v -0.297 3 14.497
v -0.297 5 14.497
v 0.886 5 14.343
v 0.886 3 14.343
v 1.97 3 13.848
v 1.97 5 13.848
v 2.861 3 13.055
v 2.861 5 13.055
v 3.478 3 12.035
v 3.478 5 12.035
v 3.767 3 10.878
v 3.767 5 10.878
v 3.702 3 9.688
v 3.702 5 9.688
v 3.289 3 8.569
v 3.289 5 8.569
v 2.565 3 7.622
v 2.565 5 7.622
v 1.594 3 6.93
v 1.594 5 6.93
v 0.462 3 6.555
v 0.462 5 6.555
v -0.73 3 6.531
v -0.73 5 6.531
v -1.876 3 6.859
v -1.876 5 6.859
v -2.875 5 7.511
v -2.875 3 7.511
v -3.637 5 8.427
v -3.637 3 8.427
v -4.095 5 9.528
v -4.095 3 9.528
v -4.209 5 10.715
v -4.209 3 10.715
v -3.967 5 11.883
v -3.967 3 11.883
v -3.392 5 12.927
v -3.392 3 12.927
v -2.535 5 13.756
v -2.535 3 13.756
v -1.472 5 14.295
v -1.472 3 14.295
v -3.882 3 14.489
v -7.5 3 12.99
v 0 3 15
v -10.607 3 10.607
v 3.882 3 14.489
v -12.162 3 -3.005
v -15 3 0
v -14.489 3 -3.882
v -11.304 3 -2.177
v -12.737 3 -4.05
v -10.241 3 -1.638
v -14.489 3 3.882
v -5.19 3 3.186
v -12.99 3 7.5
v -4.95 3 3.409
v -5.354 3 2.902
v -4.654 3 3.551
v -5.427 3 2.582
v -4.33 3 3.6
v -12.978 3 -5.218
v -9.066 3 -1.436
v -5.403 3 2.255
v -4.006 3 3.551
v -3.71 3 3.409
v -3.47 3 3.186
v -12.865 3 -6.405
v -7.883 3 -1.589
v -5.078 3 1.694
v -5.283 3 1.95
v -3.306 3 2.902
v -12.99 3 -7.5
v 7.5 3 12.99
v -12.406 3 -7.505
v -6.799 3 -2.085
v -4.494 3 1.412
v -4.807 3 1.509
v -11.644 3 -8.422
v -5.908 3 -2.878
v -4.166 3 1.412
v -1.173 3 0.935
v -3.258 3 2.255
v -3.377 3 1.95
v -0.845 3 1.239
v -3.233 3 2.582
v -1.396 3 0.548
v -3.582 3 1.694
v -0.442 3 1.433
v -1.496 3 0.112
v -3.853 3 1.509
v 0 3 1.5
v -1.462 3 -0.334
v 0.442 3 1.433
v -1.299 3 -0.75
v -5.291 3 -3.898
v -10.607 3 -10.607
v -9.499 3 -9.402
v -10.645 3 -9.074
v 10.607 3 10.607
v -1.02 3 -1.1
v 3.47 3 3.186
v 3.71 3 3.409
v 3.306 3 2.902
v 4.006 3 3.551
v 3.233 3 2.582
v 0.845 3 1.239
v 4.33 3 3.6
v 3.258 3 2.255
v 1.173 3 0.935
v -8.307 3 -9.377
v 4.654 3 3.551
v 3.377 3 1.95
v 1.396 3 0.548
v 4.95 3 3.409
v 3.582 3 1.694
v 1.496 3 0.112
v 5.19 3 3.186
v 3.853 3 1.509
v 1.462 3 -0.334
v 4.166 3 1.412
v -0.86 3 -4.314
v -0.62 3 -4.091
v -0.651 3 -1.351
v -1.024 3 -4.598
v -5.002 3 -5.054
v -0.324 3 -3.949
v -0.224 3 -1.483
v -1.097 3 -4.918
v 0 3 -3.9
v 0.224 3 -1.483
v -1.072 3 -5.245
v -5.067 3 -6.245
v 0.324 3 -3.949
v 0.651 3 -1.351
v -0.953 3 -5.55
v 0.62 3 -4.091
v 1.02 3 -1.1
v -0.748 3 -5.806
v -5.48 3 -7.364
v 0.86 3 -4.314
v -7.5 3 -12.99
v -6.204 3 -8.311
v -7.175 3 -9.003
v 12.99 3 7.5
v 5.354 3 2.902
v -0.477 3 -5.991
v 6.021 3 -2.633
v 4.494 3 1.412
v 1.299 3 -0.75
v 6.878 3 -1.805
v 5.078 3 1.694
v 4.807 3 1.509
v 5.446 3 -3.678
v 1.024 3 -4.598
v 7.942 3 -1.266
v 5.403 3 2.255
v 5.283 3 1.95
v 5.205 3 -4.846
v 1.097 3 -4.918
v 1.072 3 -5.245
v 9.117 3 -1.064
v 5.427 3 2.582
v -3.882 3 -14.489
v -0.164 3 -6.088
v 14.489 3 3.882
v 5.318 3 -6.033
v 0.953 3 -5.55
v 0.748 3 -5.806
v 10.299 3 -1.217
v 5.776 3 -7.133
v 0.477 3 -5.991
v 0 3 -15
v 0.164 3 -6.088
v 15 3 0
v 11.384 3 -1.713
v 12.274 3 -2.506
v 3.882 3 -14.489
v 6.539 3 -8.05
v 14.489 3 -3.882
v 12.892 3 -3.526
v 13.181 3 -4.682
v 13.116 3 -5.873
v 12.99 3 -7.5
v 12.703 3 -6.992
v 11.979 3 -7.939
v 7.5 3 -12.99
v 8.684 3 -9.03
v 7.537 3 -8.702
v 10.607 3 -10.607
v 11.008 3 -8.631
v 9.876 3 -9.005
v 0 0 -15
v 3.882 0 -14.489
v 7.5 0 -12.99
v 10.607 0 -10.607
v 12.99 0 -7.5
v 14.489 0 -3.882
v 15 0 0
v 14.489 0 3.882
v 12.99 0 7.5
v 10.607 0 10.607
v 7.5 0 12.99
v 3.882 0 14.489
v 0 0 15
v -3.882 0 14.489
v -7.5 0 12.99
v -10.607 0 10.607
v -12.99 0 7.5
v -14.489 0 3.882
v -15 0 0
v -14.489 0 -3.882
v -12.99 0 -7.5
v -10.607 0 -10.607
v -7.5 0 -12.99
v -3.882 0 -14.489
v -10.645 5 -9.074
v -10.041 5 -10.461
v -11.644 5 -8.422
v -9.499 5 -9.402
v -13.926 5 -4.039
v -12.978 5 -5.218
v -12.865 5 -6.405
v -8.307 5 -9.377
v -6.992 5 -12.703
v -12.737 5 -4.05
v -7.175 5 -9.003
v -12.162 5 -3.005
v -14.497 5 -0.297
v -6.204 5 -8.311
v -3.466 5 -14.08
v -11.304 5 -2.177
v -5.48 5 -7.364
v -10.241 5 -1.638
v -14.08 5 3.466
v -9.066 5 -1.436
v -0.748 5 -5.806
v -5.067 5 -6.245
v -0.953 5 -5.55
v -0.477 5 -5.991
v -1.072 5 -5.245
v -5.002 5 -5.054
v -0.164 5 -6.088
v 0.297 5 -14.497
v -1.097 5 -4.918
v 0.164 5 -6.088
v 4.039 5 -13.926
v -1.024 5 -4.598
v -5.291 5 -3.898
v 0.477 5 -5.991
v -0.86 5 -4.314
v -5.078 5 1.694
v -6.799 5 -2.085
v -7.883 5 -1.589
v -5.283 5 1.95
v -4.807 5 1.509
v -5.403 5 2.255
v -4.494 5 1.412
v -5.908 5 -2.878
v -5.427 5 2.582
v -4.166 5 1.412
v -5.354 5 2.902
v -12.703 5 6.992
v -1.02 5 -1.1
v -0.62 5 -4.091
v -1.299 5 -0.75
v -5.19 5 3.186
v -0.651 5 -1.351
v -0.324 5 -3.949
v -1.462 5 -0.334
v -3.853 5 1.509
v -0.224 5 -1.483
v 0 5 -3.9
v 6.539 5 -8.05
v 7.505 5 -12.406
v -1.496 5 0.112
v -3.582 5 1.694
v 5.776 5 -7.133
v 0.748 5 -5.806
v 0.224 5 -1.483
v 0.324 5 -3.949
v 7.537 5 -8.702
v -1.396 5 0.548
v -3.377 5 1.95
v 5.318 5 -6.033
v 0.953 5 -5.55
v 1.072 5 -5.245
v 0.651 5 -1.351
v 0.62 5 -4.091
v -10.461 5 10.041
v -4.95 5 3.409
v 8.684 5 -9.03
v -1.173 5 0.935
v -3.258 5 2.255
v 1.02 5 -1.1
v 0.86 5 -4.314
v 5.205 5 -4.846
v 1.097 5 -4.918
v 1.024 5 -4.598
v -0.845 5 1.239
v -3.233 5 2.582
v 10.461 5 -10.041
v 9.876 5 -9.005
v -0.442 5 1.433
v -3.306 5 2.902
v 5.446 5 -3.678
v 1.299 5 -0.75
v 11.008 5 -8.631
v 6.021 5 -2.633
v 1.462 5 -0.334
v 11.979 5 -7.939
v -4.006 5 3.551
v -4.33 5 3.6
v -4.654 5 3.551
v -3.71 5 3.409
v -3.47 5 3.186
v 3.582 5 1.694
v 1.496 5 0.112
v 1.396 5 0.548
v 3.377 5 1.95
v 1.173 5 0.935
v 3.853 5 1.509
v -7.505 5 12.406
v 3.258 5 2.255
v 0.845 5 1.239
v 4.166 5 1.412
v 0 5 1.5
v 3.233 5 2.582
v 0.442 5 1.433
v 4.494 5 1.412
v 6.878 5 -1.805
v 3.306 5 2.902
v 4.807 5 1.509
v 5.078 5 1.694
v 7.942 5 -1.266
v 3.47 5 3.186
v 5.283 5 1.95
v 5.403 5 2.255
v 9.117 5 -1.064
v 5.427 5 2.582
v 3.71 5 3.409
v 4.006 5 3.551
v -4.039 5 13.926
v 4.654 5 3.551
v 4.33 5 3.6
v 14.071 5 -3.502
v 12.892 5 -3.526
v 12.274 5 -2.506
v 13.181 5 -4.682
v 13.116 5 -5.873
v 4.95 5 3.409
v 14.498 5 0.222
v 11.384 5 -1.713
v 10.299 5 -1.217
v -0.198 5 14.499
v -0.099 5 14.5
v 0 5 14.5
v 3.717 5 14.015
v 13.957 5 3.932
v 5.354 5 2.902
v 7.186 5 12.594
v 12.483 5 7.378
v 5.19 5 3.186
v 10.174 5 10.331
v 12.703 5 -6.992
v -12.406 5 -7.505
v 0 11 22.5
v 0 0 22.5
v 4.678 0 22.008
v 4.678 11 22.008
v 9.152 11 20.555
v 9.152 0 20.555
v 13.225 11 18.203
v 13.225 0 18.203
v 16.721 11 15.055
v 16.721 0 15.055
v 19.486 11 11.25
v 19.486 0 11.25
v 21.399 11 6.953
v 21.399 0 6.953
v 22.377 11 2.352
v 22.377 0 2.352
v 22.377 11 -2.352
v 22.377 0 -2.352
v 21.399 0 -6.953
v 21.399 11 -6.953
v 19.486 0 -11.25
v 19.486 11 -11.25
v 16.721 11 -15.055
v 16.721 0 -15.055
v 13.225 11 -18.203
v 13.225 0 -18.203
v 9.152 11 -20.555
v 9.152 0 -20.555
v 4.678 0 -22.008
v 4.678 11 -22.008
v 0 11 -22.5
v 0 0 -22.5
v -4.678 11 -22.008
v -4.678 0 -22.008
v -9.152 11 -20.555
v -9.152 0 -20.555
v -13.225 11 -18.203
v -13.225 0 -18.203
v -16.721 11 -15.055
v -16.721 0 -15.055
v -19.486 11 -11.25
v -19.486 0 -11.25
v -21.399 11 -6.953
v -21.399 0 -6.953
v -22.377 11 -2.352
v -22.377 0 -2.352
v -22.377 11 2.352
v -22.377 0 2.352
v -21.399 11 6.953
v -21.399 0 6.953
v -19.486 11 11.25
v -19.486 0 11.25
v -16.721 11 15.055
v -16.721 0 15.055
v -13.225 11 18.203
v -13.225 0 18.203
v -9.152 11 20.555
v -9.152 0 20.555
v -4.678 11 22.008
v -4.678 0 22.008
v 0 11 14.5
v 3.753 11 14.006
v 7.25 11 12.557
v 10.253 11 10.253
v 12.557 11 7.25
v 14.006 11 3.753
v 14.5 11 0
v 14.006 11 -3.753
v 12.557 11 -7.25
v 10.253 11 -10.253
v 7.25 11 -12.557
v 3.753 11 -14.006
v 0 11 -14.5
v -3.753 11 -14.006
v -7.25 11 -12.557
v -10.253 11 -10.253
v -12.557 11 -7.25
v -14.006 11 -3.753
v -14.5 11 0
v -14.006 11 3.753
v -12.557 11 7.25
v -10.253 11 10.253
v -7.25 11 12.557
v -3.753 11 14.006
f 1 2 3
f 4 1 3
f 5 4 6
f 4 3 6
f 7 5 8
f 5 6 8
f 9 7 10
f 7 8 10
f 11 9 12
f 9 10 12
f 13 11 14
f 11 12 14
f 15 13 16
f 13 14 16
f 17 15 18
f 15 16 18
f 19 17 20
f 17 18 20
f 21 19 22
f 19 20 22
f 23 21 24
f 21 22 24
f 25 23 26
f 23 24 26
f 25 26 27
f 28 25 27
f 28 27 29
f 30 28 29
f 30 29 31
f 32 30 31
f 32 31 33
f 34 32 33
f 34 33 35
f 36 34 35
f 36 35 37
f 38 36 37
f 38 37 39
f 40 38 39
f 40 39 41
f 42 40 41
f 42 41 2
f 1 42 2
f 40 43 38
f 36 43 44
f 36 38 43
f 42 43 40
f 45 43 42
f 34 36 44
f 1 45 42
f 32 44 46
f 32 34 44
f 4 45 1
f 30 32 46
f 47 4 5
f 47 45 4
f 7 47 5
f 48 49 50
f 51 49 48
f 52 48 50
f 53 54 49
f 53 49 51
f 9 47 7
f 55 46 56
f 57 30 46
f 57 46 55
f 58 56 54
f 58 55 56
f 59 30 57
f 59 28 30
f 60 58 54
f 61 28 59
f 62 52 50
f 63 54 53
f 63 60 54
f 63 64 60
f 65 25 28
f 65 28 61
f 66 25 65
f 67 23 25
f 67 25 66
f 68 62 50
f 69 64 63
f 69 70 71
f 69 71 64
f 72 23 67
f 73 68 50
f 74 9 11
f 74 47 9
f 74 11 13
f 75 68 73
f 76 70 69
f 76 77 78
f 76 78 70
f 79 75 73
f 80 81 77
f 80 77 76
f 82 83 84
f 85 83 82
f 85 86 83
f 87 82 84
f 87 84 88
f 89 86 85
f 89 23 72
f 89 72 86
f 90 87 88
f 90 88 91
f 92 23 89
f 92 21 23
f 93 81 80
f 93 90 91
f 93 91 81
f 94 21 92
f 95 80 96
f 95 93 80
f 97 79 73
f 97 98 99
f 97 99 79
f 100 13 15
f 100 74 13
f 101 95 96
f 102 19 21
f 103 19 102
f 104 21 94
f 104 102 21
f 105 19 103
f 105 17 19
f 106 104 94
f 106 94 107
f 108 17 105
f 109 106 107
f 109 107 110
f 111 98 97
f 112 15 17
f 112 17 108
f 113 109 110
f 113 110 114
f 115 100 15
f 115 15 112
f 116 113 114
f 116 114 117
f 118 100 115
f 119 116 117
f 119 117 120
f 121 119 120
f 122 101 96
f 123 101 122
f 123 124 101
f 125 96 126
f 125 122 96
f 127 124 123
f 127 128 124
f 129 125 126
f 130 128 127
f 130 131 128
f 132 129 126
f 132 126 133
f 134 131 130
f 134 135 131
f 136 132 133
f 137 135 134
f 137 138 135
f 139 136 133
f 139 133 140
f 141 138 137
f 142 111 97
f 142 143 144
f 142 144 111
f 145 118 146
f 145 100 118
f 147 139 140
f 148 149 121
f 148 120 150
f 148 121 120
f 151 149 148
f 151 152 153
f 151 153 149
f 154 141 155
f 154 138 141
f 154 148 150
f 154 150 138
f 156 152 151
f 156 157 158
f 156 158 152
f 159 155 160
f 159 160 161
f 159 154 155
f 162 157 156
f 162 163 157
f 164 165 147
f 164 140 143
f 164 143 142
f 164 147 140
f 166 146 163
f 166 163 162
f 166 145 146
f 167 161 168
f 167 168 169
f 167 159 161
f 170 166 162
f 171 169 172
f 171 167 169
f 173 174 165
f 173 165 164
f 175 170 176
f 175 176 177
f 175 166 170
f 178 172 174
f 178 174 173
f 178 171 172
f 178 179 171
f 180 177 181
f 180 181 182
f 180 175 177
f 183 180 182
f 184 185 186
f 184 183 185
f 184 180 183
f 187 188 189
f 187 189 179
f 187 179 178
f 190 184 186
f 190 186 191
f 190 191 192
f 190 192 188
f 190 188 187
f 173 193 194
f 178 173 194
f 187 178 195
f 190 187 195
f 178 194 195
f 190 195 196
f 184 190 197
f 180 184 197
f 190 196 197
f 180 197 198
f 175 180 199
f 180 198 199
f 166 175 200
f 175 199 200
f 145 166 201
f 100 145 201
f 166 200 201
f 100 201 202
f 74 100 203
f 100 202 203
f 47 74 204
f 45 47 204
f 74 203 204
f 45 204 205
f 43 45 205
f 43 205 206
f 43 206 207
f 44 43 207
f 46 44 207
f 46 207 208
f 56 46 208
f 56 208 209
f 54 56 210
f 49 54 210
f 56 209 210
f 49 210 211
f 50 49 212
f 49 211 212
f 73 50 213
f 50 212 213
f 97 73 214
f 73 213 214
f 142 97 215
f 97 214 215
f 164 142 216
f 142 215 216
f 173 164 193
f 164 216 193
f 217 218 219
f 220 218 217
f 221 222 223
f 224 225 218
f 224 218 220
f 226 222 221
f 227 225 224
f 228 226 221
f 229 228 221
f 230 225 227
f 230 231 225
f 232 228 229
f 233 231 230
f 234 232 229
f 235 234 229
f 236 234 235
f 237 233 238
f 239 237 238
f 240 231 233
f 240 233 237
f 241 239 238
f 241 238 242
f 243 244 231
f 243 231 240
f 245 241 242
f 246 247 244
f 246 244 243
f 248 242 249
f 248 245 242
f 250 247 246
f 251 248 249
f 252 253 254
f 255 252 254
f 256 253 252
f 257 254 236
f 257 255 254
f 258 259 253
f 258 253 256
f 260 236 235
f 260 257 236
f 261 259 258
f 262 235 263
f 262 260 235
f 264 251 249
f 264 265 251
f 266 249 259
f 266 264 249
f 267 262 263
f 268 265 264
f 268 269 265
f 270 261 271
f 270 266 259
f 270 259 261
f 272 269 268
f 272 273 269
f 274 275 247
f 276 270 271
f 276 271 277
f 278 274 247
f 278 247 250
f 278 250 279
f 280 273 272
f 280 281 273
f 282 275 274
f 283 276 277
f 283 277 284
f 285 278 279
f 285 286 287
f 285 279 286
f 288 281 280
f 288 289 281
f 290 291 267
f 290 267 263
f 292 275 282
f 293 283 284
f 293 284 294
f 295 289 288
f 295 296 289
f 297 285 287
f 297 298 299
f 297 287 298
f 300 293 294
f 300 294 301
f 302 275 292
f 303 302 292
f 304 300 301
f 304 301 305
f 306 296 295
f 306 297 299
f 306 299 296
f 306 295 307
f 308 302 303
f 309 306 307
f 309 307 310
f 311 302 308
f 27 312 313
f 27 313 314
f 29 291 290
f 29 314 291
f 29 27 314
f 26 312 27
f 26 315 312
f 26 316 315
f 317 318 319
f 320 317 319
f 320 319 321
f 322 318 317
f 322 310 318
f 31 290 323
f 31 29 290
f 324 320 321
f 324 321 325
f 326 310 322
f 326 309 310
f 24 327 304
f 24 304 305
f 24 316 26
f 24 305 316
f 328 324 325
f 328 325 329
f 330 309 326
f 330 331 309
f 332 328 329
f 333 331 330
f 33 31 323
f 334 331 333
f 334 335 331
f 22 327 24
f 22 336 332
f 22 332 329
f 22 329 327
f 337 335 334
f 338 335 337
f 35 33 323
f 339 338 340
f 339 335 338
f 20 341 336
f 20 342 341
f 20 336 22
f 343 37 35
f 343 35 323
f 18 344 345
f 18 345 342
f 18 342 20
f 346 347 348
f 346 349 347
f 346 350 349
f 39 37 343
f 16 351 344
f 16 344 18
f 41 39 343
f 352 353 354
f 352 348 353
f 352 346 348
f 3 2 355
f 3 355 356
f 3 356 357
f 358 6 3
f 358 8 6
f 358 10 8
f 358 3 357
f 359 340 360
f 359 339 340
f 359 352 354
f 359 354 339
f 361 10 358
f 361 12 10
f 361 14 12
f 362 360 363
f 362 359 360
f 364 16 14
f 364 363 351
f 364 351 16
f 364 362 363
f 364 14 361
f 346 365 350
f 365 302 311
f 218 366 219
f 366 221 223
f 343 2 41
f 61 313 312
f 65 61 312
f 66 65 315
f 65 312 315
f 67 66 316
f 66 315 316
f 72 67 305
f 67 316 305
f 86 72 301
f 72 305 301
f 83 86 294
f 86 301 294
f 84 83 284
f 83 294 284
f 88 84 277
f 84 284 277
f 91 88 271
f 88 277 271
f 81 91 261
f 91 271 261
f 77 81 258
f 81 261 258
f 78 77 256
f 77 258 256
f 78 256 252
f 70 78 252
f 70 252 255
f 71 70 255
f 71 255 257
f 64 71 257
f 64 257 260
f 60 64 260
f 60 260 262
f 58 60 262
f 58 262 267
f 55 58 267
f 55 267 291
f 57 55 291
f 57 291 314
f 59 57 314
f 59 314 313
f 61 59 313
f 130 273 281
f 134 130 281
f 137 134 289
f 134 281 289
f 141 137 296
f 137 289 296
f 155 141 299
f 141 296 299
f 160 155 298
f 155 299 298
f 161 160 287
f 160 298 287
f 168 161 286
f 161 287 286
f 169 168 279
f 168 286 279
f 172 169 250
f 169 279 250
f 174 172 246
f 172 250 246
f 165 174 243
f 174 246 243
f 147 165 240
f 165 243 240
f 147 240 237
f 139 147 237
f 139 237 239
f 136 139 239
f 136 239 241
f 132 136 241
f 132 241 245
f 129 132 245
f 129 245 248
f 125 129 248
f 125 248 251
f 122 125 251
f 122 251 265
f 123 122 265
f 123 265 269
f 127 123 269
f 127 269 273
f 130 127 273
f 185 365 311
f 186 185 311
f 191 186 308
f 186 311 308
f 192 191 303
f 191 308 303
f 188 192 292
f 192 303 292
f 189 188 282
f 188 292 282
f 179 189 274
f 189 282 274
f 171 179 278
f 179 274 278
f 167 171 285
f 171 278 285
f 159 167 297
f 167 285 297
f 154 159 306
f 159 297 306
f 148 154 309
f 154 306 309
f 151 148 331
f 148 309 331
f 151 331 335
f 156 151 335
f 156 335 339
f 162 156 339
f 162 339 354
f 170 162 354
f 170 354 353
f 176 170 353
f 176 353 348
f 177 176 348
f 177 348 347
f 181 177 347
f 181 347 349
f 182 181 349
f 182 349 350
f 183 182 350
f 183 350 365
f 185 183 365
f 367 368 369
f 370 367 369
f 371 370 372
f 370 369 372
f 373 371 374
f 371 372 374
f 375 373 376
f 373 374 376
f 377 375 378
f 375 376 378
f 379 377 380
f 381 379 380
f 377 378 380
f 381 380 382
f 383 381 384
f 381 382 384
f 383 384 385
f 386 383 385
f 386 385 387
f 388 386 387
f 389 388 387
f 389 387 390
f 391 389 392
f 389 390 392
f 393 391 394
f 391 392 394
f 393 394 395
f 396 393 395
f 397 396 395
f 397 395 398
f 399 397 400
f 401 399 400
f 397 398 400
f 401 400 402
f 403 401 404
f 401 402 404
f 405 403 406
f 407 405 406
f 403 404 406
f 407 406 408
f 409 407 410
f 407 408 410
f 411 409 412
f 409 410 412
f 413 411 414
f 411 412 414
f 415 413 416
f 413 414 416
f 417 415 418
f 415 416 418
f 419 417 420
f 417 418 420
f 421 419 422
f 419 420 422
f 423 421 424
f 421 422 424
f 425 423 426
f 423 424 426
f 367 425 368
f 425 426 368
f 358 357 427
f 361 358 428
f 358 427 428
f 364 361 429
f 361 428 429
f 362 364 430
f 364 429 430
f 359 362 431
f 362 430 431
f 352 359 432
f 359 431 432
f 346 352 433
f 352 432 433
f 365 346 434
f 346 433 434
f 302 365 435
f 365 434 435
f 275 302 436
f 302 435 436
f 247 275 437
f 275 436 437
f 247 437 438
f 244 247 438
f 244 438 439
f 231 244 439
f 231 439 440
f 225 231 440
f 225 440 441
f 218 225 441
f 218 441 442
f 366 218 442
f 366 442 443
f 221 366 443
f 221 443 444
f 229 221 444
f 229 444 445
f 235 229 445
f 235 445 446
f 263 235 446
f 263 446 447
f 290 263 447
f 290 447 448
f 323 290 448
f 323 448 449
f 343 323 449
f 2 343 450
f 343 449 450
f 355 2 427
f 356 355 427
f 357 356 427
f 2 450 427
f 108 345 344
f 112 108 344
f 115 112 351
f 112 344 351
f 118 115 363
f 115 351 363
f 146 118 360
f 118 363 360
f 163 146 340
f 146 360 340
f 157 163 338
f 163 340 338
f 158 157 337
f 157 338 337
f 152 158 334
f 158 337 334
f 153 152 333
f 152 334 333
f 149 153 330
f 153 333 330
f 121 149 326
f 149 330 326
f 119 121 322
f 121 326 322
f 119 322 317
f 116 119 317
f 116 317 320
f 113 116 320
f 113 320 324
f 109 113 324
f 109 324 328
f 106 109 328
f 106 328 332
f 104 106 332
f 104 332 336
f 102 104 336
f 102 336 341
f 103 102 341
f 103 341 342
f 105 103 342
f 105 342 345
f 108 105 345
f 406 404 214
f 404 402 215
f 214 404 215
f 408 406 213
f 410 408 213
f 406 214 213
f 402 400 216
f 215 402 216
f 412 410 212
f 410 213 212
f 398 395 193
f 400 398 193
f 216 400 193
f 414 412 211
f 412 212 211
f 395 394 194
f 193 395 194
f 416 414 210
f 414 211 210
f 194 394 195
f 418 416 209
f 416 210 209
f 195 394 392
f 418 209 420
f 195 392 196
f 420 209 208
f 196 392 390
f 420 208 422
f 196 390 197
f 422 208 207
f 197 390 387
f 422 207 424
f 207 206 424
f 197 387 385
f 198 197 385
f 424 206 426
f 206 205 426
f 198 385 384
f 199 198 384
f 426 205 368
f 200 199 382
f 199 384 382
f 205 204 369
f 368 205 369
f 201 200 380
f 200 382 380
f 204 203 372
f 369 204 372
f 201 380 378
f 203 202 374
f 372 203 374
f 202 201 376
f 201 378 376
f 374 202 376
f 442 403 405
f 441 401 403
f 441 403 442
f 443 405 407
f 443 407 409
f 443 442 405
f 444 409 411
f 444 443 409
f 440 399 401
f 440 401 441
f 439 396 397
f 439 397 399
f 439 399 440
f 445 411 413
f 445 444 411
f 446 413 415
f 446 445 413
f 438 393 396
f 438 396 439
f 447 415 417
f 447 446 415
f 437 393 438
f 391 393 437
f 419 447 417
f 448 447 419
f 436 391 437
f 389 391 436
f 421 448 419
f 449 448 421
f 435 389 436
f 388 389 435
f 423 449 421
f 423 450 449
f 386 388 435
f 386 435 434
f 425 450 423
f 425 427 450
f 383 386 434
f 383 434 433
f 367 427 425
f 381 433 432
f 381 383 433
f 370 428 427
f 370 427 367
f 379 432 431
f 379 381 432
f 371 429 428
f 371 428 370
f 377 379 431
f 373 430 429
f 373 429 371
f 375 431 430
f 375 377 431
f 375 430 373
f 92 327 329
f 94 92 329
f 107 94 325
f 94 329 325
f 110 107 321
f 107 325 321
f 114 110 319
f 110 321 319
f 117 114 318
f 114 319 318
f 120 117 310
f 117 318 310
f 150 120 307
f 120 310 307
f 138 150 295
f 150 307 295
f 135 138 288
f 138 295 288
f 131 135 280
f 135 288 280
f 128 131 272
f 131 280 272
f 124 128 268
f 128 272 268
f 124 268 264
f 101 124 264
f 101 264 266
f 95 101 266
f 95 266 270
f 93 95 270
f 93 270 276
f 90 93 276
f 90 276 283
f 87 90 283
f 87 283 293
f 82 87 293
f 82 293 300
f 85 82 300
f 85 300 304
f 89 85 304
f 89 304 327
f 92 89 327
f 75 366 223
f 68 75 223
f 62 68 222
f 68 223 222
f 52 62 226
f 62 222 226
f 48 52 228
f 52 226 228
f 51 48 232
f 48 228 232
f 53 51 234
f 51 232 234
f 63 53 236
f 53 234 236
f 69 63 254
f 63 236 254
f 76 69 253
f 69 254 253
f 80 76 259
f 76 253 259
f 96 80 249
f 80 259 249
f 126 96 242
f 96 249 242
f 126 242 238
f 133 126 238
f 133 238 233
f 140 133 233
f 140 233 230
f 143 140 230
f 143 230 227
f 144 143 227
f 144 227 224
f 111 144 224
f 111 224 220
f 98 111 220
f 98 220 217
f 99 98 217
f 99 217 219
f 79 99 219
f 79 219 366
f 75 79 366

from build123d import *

# Parameters (mm, degrees)
SKETCH1_R           = 22.5
BOSS_EXTRUDE1_DEPTH = 11
SKETCH2_R           = 14.5
CUT_EXTRUDE1_DEPTH  = 6
SKETCH3_R           = 15
CUT_EXTRUDE2_DEPTH  = 3
CUT_EXTRUDE3_REACH  = 34.381
SKETCH4_R           = 1.5
SKETCH4_R_2         = 1.1
SKETCH4_R_3         = 4


with BuildPart() as part:
    # Sketch1 → Boss-Extrude1 (new body)
    with BuildSketch(Plane(origin=(0, 0, 0), x_dir=(1, 0, 0), z_dir=(0, 1, 0))):
        with Locations(Location((0, 0, 0), (0, 0, 270))):
            Circle(SKETCH1_R)
    extrude(amount=BOSS_EXTRUDE1_DEPTH)

    # Sketch2 → Cut-Extrude1 (cut)
    with BuildSketch(Plane(origin=(0, 11, 0), x_dir=(1, 0, 0), z_dir=(0, 1, 0))):
        with Locations(Location((0, 0, 0), (0, 0, 270))):
            Circle(SKETCH2_R)
    extrude(amount=-CUT_EXTRUDE1_DEPTH, mode=Mode.SUBTRACT)

    # Sketch3 → Cut-Extrude2 (cut)
    with BuildSketch(Plane.XZ):
        with Locations(Location((0, 0, 0), (0, 0, 270))):
            Circle(SKETCH3_R)
    extrude(amount=-CUT_EXTRUDE2_DEPTH, mode=Mode.SUBTRACT)

    # Sketch4 → Cut-Extrude3 (cut, up to next)
    with BuildSketch(Plane(origin=(0, 5, 0), x_dir=(1, 0, 0), z_dir=(0, 1, 0)), mode=Mode.PRIVATE) as cut_extrude3_sk1:
        with Locations(Location((0, 0, 0), (0, 0, 270))):
            Circle(SKETCH4_R)
    cut_extrude3_tool1 = extrude(cut_extrude3_sk1.sketch, amount=-CUT_EXTRUDE3_REACH, mode=Mode.PRIVATE) & part.part
    # Sketch4 → Cut-Extrude3 (cut, up to next)
    with BuildSketch(Plane(origin=(0, 5, 0), x_dir=(1, 0, 0), z_dir=(0, 1, 0)), mode=Mode.PRIVATE) as cut_extrude3_sk2:
        with Locations(Location((0, 5, 0), (0, 0, 270))):
            Circle(SKETCH4_R_2)
    cut_extrude3_tool2 = extrude(cut_extrude3_sk2.sketch, amount=-CUT_EXTRUDE3_REACH, mode=Mode.PRIVATE) & part.part
    # Sketch4 → Cut-Extrude3 (cut, up to next)
    with BuildSketch(Plane(origin=(0, 5, 0), x_dir=(1, 0, 0), z_dir=(0, 1, 0)), mode=Mode.PRIVATE) as cut_extrude3_sk3:
        with Locations(Location((4.330127019, -2.5, 0), (0, 0, 270))):
            Circle(SKETCH4_R_2)
    cut_extrude3_tool3 = extrude(cut_extrude3_sk3.sketch, amount=-CUT_EXTRUDE3_REACH, mode=Mode.PRIVATE) & part.part
    # Sketch4 → Cut-Extrude3 (cut, up to next)
    with BuildSketch(Plane(origin=(0, 5, 0), x_dir=(1, 0, 0), z_dir=(0, 1, 0)), mode=Mode.PRIVATE) as cut_extrude3_sk4:
        with Locations(Location((-4.330127019, -2.5, 0), (0, 0, 270))):
            Circle(SKETCH4_R_2)
    cut_extrude3_tool4 = extrude(cut_extrude3_sk4.sketch, amount=-CUT_EXTRUDE3_REACH, mode=Mode.PRIVATE) & part.part
    # Sketch4 → Cut-Extrude3 (cut, up to next)
    with BuildSketch(Plane(origin=(0, 5, 0), x_dir=(1, 0, 0), z_dir=(0, 1, 0)), mode=Mode.PRIVATE) as cut_extrude3_sk5:
        with Locations(Location((9.198755892, 5.062893446, 0), (0, 0, 28.828375855))):
            Circle(SKETCH4_R_3)
    cut_extrude3_tool5 = extrude(cut_extrude3_sk5.sketch, amount=-CUT_EXTRUDE3_REACH, mode=Mode.PRIVATE) & part.part
    # Sketch4 → Cut-Extrude3 (cut, up to next)
    with BuildSketch(Plane(origin=(0, 5, 0), x_dir=(1, 0, 0), z_dir=(0, 1, 0)), mode=Mode.PRIVATE) as cut_extrude3_sk6:
        with Locations(Location((-0.214783605, -10.497803008, 0), (0, 0, 268.828376506))):
            Circle(SKETCH4_R_3)
    cut_extrude3_tool6 = extrude(cut_extrude3_sk6.sketch, amount=-CUT_EXTRUDE3_REACH, mode=Mode.PRIVATE) & part.part
    # Sketch4 → Cut-Extrude3 (cut, up to next)
    with BuildSketch(Plane(origin=(0, 5, 0), x_dir=(1, 0, 0), z_dir=(0, 1, 0)), mode=Mode.PRIVATE) as cut_extrude3_sk7:
        with Locations(Location((-8.983972287, 5.434909563, 0), (0, 0, 148.828375289))):
            Circle(SKETCH4_R_3)
    cut_extrude3_tool7 = extrude(cut_extrude3_sk7.sketch, amount=-CUT_EXTRUDE3_REACH, mode=Mode.PRIVATE) & part.part
    add(cut_extrude3_tool1.solids().sort_by_distance((0, 5, 0))[0], mode=Mode.SUBTRACT)
    add(cut_extrude3_tool2.solids().sort_by_distance((0, 5, -5))[0], mode=Mode.SUBTRACT)
    add(cut_extrude3_tool3.solids().sort_by_distance((4.330127, 5, 2.5))[0], mode=Mode.SUBTRACT)
    add(cut_extrude3_tool4.solids().sort_by_distance((-4.330127, 5, 2.5))[0], mode=Mode.SUBTRACT)
    add(cut_extrude3_tool5.solids().sort_by_distance((9.198756, 5, -5.062893))[0], mode=Mode.SUBTRACT)
    add(cut_extrude3_tool6.solids().sort_by_distance((-0.214784, 5, 10.497803))[0], mode=Mode.SUBTRACT)
    add(cut_extrude3_tool7.solids().sort_by_distance((-8.983972, 5, -5.43491))[0], mode=Mode.SUBTRACT)


solid = part.part
